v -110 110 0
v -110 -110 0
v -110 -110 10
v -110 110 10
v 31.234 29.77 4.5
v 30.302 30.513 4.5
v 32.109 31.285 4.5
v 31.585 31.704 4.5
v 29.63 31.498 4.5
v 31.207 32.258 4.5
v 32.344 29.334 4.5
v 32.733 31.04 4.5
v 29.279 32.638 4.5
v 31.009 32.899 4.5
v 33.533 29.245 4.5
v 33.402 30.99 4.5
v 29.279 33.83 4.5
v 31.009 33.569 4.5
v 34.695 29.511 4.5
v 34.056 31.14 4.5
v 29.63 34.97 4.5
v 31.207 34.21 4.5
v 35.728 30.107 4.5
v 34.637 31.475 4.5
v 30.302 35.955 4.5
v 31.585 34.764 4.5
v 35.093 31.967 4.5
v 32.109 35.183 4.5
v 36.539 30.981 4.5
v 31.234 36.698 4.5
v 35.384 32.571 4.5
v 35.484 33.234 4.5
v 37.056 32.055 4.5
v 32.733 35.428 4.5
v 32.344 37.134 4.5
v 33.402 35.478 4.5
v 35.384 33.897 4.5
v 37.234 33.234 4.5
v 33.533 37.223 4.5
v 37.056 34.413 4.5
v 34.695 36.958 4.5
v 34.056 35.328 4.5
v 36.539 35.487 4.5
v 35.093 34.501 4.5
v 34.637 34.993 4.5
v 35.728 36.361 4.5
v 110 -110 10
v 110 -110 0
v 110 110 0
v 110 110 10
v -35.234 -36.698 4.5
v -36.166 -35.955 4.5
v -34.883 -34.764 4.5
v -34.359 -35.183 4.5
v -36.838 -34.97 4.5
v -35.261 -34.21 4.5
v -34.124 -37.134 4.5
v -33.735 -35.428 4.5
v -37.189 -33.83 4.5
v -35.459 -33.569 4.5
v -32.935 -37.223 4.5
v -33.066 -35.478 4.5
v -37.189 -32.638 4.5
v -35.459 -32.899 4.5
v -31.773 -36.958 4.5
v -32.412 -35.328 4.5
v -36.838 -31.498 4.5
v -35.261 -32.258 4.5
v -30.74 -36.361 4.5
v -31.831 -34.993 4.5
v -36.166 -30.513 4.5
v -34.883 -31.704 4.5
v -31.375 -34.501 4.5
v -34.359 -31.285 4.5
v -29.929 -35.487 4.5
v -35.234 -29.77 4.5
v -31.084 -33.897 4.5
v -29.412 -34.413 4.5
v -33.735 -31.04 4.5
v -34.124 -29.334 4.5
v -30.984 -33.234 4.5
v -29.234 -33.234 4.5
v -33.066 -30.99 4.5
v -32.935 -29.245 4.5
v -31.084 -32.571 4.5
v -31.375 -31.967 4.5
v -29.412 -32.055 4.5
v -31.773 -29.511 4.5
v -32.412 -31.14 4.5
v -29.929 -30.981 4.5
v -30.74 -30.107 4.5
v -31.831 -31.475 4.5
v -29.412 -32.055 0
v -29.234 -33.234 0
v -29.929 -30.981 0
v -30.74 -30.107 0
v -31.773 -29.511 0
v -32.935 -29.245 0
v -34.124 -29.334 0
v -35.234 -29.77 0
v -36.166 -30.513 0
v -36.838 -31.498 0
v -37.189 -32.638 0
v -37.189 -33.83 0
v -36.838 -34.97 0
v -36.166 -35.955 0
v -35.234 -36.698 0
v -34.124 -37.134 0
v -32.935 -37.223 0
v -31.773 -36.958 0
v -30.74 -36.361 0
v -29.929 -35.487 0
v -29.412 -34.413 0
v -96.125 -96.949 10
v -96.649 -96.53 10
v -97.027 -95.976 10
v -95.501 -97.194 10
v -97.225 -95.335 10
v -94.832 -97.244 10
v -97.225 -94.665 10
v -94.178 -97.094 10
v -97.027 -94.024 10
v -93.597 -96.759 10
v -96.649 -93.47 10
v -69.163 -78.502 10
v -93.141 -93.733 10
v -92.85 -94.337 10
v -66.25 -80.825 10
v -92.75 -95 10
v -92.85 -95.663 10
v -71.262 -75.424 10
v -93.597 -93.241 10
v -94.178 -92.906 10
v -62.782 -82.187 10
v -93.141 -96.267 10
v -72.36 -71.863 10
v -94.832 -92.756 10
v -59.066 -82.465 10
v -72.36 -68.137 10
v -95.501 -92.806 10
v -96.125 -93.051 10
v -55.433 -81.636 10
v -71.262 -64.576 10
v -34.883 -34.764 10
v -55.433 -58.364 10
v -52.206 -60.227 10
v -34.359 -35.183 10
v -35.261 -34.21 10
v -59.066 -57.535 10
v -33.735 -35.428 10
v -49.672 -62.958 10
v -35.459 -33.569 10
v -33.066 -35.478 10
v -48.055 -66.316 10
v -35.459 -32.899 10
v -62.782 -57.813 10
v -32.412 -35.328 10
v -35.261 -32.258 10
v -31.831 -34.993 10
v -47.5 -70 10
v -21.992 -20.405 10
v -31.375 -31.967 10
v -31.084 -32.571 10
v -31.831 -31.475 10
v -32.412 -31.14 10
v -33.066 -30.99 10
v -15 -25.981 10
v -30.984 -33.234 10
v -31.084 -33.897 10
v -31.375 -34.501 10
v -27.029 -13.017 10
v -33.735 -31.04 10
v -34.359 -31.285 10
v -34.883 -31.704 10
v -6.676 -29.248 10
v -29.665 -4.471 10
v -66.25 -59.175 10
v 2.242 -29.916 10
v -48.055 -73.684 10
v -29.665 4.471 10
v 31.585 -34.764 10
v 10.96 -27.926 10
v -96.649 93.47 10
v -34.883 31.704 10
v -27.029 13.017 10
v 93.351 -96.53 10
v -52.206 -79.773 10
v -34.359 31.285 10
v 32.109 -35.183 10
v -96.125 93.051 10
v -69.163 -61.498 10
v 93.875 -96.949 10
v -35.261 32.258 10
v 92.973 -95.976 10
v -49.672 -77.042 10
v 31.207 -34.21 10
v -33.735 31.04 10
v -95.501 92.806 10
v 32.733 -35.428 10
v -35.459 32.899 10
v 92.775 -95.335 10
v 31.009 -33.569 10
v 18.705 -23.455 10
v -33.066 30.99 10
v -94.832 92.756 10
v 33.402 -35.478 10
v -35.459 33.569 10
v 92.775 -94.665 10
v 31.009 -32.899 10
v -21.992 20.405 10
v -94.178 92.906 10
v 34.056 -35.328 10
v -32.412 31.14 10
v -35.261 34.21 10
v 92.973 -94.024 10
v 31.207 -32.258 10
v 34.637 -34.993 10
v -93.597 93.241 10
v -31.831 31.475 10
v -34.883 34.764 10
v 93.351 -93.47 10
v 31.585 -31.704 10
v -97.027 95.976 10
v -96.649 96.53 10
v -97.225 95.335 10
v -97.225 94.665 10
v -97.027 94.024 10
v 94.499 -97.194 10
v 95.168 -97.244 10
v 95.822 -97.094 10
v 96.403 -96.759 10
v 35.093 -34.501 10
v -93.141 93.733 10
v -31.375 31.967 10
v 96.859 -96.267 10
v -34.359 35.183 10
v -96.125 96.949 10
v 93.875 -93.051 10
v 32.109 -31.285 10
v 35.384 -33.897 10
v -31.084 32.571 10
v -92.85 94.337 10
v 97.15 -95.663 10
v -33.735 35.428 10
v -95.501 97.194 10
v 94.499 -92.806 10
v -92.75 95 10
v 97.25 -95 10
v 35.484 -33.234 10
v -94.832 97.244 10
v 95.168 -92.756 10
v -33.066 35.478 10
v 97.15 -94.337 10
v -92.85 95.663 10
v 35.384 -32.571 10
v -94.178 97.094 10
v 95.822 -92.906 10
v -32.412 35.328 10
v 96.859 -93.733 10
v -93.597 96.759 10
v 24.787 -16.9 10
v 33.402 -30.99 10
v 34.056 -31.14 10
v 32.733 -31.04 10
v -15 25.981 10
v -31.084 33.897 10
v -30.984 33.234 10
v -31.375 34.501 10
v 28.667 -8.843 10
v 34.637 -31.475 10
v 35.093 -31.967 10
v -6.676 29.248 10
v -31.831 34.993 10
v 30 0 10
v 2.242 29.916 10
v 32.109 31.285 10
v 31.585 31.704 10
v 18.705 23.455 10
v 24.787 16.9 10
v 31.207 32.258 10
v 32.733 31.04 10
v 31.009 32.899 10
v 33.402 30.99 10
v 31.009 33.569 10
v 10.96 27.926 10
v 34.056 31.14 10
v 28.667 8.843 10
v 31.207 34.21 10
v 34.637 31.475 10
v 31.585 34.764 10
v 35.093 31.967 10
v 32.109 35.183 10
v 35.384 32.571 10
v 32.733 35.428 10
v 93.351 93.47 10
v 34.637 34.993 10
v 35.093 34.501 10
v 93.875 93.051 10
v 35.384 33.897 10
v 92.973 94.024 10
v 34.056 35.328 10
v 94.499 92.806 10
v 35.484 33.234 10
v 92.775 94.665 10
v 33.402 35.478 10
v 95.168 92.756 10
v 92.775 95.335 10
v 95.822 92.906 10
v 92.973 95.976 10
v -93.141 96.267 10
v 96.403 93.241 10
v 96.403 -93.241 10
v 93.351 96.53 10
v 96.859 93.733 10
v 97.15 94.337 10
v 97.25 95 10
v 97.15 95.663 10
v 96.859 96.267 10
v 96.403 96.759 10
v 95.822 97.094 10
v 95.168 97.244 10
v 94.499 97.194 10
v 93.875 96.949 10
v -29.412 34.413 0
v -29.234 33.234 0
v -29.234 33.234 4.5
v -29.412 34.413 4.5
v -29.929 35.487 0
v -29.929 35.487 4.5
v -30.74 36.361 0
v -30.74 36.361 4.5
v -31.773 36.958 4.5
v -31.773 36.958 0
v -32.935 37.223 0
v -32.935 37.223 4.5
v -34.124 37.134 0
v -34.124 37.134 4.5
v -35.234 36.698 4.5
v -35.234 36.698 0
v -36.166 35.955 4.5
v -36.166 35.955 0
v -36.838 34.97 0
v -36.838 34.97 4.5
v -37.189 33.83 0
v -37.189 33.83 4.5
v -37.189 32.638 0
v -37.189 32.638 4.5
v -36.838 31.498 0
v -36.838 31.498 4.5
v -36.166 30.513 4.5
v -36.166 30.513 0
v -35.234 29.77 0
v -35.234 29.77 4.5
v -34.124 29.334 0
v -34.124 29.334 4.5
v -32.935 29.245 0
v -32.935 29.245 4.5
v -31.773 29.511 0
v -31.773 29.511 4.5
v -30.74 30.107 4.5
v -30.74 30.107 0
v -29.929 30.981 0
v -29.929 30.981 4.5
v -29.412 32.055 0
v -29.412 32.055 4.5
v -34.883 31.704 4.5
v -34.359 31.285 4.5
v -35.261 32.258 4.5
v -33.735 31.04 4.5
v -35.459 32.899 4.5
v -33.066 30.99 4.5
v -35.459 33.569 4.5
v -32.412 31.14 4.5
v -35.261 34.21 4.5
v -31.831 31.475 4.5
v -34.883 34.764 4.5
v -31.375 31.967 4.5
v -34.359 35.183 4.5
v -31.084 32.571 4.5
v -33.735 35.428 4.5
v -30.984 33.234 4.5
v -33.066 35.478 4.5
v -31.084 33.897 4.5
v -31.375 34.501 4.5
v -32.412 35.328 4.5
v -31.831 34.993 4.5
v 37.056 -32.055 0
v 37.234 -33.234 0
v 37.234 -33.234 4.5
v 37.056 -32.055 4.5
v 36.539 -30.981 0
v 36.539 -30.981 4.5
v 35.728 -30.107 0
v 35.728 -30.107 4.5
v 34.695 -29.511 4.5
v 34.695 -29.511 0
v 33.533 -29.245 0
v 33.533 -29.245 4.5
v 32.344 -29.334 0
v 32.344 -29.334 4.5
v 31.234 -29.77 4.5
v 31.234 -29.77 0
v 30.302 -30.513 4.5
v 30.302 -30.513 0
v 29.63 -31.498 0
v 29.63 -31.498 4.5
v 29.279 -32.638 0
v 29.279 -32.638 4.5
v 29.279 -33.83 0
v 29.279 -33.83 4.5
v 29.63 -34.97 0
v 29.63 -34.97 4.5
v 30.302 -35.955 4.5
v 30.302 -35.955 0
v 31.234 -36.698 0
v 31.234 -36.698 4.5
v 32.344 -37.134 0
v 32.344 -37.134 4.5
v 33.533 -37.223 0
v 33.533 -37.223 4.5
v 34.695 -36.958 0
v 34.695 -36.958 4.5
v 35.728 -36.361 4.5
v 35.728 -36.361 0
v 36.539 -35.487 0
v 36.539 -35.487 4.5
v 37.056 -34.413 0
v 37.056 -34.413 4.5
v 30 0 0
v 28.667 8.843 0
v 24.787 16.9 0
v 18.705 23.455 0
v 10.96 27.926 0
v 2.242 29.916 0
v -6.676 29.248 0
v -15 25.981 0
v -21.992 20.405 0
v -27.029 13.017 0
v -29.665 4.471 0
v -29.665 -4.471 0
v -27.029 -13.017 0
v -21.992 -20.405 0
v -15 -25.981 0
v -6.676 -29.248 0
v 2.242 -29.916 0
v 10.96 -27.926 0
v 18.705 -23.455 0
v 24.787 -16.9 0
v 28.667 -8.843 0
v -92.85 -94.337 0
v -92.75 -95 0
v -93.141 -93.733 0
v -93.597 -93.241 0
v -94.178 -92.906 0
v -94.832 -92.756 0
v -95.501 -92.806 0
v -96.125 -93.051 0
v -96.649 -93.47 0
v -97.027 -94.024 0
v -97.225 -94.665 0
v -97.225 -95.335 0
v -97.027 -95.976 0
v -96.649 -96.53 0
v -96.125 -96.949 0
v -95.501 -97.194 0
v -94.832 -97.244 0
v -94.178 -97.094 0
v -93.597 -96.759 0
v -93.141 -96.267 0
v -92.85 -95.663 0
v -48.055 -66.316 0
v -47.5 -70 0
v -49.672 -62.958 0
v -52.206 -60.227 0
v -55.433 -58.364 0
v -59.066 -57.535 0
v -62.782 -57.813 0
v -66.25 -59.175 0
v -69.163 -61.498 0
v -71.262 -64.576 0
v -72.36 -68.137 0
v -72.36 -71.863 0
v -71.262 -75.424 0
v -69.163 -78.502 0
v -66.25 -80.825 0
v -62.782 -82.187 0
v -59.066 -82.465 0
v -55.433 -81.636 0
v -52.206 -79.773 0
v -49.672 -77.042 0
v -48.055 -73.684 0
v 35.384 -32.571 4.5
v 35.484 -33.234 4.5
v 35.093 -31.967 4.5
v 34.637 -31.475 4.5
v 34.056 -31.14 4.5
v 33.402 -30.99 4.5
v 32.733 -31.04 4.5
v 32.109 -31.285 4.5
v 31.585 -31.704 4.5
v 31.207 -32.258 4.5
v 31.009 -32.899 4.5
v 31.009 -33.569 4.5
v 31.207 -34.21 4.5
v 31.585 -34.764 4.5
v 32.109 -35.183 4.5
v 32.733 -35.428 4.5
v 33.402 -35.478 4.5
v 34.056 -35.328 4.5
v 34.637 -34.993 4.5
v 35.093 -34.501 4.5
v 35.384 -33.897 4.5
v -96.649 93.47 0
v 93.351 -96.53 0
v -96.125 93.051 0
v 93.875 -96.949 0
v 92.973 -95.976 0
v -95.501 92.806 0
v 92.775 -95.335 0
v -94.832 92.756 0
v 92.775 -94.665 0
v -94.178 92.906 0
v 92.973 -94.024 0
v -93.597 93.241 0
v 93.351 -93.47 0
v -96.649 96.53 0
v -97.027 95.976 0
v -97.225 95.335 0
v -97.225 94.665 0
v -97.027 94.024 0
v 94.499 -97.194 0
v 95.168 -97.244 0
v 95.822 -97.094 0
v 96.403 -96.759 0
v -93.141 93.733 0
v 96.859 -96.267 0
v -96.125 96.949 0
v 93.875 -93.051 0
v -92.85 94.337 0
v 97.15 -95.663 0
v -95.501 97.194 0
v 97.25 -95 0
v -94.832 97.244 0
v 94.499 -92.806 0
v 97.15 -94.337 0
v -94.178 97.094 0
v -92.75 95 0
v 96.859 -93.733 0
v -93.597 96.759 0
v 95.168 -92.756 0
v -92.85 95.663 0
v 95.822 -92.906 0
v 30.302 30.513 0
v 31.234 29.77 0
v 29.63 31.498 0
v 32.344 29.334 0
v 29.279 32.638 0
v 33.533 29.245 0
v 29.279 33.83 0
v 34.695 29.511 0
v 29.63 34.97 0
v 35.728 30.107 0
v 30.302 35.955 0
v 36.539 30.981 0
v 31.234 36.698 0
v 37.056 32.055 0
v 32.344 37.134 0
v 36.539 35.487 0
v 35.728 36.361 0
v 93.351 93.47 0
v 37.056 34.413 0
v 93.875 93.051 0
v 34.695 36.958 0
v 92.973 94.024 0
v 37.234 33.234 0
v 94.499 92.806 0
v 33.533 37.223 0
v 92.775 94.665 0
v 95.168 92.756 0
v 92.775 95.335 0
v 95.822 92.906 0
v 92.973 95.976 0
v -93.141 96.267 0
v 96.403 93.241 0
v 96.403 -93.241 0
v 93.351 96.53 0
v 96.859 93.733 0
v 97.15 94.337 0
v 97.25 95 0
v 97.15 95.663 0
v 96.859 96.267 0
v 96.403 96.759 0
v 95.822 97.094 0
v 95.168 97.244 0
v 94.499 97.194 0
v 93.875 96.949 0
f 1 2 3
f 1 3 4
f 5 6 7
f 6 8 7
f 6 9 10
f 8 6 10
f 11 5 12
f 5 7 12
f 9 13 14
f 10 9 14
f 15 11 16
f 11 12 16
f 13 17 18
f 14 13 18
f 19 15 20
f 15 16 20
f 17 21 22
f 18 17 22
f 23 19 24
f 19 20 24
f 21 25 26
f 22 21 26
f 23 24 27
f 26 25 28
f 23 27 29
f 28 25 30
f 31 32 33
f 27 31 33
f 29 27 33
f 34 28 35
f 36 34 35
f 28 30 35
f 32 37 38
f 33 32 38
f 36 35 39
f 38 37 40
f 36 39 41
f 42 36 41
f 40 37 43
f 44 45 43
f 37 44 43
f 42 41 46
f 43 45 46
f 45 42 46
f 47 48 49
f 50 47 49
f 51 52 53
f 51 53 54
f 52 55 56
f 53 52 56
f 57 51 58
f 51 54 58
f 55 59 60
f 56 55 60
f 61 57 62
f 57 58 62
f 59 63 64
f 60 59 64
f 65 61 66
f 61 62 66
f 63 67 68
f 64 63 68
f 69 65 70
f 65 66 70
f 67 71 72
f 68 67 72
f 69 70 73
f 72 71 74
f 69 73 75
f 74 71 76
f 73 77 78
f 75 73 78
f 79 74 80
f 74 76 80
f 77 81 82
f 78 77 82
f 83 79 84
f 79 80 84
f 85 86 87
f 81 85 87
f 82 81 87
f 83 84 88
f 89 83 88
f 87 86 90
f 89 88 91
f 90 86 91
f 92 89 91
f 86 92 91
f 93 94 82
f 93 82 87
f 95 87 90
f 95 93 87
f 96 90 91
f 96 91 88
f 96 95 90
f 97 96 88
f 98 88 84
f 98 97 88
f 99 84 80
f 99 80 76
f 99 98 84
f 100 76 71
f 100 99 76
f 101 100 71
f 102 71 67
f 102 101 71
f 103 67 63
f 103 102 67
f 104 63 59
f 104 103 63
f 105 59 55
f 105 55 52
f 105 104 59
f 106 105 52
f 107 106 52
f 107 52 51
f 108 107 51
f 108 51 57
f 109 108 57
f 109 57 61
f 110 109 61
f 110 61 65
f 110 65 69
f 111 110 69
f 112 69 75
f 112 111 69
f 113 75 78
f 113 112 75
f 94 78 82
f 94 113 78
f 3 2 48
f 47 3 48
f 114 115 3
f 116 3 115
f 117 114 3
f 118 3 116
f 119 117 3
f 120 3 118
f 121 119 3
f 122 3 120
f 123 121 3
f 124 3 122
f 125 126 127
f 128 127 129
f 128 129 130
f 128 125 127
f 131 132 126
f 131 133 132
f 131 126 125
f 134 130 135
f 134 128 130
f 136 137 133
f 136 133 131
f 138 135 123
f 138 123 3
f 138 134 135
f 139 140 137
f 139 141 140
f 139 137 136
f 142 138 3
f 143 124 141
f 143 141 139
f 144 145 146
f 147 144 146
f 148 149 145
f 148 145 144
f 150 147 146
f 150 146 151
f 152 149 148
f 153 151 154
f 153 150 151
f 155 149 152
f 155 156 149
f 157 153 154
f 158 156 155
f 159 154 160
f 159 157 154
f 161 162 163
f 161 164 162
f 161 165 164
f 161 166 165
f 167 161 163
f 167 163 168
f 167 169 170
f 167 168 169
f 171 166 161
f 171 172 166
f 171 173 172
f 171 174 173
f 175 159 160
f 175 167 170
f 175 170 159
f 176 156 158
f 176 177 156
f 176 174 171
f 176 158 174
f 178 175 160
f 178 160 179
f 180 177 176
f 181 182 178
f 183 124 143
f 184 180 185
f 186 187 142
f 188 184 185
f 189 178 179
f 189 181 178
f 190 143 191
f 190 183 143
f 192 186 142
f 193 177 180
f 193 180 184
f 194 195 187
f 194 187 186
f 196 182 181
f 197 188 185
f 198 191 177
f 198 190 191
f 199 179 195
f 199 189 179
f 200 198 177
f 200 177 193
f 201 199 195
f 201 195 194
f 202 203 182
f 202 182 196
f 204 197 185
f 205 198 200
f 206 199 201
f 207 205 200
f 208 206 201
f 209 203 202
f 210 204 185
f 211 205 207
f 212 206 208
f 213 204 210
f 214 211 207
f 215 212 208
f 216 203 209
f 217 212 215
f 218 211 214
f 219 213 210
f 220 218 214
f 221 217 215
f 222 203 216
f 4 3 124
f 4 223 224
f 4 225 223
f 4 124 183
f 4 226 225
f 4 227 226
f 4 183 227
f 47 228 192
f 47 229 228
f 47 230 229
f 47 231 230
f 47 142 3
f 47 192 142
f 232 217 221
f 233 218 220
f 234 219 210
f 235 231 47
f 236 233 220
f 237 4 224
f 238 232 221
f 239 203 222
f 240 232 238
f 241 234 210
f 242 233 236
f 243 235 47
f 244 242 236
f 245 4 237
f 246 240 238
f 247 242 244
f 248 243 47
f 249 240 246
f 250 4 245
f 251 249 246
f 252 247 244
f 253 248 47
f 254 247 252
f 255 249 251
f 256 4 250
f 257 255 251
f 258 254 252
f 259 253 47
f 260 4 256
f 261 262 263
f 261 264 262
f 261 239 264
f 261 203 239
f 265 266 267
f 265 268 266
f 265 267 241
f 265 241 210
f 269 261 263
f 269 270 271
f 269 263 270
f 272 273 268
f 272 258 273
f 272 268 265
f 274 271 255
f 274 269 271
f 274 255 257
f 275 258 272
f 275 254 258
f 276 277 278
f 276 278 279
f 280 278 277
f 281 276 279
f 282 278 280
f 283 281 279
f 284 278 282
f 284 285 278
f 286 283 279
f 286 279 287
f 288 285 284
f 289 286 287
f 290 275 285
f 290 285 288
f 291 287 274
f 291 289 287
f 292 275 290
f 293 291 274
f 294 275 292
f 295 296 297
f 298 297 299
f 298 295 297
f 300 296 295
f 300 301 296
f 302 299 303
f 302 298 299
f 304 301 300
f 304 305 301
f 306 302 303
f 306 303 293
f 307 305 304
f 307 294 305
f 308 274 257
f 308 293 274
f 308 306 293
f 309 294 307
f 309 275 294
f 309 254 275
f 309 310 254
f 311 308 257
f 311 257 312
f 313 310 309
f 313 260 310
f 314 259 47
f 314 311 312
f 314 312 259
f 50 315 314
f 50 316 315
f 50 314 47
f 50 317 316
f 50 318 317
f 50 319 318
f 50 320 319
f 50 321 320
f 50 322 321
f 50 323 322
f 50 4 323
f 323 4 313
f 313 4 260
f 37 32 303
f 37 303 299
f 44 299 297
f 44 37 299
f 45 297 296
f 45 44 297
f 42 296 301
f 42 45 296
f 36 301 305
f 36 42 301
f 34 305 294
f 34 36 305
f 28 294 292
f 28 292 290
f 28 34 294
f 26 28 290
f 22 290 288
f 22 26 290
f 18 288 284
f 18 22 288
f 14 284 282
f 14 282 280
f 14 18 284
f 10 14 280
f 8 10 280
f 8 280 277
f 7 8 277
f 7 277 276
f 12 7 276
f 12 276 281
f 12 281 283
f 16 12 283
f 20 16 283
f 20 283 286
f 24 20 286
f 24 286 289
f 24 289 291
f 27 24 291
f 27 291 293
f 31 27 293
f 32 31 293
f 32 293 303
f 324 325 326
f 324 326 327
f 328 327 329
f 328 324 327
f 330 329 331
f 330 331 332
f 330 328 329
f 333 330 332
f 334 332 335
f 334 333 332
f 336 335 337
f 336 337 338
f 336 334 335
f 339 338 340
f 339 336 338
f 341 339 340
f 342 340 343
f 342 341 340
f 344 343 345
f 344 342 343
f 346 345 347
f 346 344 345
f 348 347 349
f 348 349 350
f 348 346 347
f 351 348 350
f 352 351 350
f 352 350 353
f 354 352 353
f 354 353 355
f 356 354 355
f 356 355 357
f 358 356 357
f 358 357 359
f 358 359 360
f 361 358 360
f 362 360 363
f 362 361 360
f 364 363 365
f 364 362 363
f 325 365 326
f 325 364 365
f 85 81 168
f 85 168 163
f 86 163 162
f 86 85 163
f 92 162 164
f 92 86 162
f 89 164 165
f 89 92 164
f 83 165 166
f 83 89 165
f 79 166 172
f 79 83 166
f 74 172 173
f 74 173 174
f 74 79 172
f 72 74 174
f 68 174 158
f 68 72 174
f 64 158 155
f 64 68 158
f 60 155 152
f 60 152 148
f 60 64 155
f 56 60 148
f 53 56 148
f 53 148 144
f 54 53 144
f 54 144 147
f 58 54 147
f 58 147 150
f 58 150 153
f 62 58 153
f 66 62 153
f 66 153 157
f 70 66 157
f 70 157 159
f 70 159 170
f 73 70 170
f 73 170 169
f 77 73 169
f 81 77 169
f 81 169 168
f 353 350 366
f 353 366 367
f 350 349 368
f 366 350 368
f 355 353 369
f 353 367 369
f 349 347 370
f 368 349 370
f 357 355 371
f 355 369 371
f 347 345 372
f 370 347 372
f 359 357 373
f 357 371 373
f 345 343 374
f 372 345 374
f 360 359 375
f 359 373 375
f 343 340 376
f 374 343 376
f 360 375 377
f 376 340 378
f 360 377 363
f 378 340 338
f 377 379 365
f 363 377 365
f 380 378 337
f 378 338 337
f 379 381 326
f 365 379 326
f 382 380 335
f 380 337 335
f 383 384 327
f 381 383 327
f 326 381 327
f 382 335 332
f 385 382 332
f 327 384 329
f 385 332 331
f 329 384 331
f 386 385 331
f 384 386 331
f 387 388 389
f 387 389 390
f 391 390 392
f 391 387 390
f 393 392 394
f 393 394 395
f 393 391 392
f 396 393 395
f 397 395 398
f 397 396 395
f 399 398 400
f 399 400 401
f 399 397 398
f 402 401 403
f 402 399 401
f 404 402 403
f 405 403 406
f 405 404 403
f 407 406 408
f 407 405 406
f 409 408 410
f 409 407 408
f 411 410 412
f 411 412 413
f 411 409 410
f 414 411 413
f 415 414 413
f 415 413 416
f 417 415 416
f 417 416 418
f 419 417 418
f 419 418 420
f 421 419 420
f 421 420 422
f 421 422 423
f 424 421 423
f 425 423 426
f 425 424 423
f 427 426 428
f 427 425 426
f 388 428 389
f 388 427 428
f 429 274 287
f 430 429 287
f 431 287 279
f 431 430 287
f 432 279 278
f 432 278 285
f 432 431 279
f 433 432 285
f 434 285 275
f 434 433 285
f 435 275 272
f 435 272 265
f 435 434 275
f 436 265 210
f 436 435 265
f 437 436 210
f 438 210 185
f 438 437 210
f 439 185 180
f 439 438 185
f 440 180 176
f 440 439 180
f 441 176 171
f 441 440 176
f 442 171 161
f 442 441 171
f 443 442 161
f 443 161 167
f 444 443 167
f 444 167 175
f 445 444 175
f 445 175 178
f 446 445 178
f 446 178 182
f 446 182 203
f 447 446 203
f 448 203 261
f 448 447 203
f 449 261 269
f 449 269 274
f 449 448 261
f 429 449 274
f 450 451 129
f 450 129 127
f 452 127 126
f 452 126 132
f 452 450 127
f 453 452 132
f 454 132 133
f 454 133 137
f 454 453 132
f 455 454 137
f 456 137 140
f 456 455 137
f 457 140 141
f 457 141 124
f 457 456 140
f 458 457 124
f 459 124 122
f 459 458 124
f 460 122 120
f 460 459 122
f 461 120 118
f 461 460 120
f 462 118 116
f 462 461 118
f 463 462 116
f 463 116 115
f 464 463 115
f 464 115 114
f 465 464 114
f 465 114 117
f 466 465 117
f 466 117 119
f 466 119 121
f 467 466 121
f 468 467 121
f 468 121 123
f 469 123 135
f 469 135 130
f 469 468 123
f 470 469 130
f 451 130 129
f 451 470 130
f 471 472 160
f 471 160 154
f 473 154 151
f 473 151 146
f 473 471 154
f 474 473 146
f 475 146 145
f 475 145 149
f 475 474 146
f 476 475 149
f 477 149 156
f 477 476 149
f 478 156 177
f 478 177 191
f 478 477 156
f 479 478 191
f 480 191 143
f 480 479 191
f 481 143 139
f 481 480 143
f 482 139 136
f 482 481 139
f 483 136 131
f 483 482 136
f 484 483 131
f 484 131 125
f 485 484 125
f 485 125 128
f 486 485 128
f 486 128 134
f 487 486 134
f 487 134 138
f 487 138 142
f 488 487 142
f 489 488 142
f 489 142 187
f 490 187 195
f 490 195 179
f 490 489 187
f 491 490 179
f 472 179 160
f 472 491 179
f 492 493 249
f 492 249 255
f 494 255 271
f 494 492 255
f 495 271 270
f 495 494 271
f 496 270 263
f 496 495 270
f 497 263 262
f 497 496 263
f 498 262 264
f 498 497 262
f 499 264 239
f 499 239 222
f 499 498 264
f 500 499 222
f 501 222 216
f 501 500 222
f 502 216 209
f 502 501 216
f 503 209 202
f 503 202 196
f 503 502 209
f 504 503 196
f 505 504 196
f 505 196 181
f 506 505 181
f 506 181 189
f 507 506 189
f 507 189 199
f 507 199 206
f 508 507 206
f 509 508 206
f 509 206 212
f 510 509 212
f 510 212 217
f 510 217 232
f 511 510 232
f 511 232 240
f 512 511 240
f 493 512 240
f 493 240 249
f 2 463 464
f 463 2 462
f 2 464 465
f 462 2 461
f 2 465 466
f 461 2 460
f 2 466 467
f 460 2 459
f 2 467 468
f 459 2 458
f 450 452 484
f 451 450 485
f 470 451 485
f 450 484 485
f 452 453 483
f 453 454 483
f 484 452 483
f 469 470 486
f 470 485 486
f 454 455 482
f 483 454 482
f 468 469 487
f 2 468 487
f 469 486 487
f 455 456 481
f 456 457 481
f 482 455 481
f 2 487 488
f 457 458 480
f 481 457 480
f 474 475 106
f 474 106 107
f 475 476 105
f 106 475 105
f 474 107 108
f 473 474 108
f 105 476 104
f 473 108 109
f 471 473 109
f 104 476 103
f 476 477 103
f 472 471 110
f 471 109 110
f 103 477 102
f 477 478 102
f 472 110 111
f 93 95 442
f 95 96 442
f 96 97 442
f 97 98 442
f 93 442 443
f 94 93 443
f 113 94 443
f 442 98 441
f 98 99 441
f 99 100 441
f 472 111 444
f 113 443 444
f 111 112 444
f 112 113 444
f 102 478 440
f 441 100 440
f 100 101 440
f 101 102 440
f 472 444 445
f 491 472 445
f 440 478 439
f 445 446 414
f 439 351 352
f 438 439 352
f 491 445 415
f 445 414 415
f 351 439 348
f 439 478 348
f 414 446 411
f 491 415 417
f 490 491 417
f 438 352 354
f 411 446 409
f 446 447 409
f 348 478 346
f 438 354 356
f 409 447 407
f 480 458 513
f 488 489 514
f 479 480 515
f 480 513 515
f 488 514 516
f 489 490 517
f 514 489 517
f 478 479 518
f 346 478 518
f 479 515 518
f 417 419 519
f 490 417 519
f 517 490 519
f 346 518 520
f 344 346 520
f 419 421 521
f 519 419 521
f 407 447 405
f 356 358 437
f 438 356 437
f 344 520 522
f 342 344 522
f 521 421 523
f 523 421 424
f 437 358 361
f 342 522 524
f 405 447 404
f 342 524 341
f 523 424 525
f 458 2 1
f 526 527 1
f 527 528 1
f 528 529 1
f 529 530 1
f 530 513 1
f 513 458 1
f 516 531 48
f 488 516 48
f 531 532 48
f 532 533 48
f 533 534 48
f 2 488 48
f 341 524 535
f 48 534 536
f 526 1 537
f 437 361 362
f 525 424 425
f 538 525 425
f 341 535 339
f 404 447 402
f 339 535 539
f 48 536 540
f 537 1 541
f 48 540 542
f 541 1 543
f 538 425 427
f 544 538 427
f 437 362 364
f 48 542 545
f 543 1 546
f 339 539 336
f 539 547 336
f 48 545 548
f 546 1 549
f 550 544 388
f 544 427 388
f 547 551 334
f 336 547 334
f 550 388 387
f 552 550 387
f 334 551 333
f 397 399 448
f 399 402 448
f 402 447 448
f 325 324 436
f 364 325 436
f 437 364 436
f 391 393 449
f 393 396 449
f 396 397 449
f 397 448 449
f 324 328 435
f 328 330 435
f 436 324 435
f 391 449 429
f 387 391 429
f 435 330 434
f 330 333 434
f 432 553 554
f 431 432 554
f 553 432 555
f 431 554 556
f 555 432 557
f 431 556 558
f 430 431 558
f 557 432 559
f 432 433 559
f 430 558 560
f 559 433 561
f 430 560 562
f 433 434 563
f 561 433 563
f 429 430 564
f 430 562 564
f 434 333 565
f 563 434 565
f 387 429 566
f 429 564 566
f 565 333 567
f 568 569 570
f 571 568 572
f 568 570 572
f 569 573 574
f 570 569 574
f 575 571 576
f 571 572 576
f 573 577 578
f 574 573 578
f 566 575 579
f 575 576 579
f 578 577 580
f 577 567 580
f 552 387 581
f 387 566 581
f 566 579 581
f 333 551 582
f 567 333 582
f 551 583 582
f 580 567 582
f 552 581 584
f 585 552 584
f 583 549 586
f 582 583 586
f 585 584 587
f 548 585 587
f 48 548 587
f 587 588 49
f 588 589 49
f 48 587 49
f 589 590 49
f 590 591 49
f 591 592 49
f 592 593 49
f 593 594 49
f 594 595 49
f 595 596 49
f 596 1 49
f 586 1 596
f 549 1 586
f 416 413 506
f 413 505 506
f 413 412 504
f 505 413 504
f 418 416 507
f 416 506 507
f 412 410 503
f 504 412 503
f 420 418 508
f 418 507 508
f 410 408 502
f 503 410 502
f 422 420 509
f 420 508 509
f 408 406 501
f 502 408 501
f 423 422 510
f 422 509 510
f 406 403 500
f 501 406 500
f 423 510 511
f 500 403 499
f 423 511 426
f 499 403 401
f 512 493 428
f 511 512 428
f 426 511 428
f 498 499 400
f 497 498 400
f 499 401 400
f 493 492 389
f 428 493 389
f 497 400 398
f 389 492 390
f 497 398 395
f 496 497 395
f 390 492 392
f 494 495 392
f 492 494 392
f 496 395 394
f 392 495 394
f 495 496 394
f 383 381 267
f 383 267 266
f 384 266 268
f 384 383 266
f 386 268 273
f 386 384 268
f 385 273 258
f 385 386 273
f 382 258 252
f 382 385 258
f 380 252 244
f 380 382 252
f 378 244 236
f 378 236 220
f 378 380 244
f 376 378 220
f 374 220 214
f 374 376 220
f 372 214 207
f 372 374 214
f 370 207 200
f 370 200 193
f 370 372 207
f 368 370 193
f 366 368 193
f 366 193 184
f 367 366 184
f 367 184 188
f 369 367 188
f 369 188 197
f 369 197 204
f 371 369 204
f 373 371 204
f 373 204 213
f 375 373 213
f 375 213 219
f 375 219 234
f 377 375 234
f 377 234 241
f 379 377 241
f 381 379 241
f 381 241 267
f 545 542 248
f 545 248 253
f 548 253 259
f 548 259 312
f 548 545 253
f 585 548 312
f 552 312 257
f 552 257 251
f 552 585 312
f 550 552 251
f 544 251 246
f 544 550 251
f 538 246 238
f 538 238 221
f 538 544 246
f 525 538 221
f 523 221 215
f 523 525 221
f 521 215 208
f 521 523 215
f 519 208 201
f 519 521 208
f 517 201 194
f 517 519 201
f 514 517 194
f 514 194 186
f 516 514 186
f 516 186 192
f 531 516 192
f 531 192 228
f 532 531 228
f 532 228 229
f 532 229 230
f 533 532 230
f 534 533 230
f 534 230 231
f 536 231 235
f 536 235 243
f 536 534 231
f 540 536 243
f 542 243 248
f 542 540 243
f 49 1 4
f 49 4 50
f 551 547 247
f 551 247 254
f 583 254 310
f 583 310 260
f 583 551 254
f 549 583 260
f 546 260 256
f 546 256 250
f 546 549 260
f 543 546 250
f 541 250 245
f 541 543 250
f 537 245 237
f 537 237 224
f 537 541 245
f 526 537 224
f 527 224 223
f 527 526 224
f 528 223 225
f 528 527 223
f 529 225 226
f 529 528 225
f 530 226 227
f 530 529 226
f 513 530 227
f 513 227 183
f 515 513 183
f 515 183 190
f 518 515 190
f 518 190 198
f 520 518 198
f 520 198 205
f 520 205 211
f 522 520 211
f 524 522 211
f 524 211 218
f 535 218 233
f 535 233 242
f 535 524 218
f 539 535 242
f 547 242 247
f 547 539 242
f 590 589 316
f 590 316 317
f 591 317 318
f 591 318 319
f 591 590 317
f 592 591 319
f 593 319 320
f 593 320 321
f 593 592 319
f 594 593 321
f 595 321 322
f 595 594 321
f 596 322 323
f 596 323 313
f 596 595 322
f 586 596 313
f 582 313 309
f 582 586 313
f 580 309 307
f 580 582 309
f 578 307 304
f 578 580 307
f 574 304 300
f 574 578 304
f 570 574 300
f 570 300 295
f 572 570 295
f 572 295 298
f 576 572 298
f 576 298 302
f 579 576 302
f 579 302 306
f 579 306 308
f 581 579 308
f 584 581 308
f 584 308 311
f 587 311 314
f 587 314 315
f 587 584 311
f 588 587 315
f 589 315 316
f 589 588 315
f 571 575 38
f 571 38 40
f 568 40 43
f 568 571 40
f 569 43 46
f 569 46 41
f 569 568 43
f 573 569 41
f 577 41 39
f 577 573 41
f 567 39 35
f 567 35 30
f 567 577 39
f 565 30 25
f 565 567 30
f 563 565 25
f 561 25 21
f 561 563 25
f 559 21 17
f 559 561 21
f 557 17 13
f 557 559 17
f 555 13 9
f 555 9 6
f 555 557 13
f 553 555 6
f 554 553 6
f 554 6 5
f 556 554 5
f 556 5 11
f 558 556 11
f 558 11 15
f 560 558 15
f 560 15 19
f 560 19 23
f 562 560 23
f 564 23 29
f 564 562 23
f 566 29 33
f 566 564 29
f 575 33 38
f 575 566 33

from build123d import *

# Parameters (mm, degrees)
SK_PLACA_W                         = 220
SK_PLACA_H                         = 220
PLACA_DEPTH                        = 10
SK_PASO_CABLES_R                   = 30
PASO_CABLES_DEPTH                  = 10
SK_PASANTES_M4_PEDESTAL_R          = 2.25
PASANTES_M4_PEDESTAL_DEPTH         = 10
SK_CAJAS_M4_INFERIORES_R           = 4
CAJAS_M4_INFERIORES_DEPTH          = 4.5
SK_PASANTES_M4_SEPARADORES_CAJA_R  = 2.25
PASANTES_M4_SEPARADORES_CAJA_DEPTH = 10
SK_PASO_CABLES_CAJA_R              = 12.5
PASO_CABLES_CAJA_DEPTH             = 10


with BuildPart() as part:
    # Sk_Placa → Placa (new body)
    with BuildSketch(Plane.XY):
        Rectangle(SK_PLACA_W, SK_PLACA_H)
    extrude(amount=PLACA_DEPTH)

    # Sk_Paso_cables → Paso_cables (cut)
    with BuildSketch(Plane.XY):
        Circle(SK_PASO_CABLES_R)
    extrude(amount=PASO_CABLES_DEPTH, mode=Mode.SUBTRACT)

    # Sk_Pasantes_M4_pedestal → Pasantes_M4_pedestal (cut)
    with BuildSketch(Plane.XY):
        with Locations((33.234018716, 33.234018716)):
            Circle(SK_PASANTES_M4_PEDESTAL_R)
        with Locations((-33.234018716, 33.234018716)):
            Circle(SK_PASANTES_M4_PEDESTAL_R)
        with Locations((-33.234018716, -33.234018716)):
            Circle(SK_PASANTES_M4_PEDESTAL_R)
        with Locations((33.234018716, -33.234018716)):
            Circle(SK_PASANTES_M4_PEDESTAL_R)
    extrude(amount=PASANTES_M4_PEDESTAL_DEPTH, mode=Mode.SUBTRACT)

    # Sk_Cajas_M4_inferiores → Cajas_M4_inferiores (cut)
    with BuildSketch(Plane.XY):
        with Locations((33.234018716, 33.234018716)):
            Circle(SK_CAJAS_M4_INFERIORES_R)
        with Locations((-33.234018716, 33.234018716)):
            Circle(SK_CAJAS_M4_INFERIORES_R)
        with Locations((-33.234018716, -33.234018716)):
            Circle(SK_CAJAS_M4_INFERIORES_R)
        with Locations((33.234018716, -33.234018716)):
            Circle(SK_CAJAS_M4_INFERIORES_R)
    extrude(amount=CAJAS_M4_INFERIORES_DEPTH, mode=Mode.SUBTRACT)

    # Sk_Pasantes_M4_separadores_caja → Pasantes_M4_separadores_caja (cut)
    with BuildSketch(Plane.XY):
        with Locations((-95, -95)):
            Circle(SK_PASANTES_M4_SEPARADORES_CAJA_R)
        with Locations((-95, 95)):
            Circle(SK_PASANTES_M4_SEPARADORES_CAJA_R)
        with Locations((95, -95)):
            Circle(SK_PASANTES_M4_SEPARADORES_CAJA_R)
        with Locations((95, 95)):
            Circle(SK_PASANTES_M4_SEPARADORES_CAJA_R)
    extrude(amount=PASANTES_M4_SEPARADORES_CAJA_DEPTH, mode=Mode.SUBTRACT)

    # Sk_Paso_cables_caja → Paso_cables_caja (cut)
    with BuildSketch(Plane.XY):
        with Locations((-60, -70)):
            Circle(SK_PASO_CABLES_CAJA_R)
    extrude(amount=PASO_CABLES_CAJA_DEPTH, mode=Mode.SUBTRACT)


solid = part.part
